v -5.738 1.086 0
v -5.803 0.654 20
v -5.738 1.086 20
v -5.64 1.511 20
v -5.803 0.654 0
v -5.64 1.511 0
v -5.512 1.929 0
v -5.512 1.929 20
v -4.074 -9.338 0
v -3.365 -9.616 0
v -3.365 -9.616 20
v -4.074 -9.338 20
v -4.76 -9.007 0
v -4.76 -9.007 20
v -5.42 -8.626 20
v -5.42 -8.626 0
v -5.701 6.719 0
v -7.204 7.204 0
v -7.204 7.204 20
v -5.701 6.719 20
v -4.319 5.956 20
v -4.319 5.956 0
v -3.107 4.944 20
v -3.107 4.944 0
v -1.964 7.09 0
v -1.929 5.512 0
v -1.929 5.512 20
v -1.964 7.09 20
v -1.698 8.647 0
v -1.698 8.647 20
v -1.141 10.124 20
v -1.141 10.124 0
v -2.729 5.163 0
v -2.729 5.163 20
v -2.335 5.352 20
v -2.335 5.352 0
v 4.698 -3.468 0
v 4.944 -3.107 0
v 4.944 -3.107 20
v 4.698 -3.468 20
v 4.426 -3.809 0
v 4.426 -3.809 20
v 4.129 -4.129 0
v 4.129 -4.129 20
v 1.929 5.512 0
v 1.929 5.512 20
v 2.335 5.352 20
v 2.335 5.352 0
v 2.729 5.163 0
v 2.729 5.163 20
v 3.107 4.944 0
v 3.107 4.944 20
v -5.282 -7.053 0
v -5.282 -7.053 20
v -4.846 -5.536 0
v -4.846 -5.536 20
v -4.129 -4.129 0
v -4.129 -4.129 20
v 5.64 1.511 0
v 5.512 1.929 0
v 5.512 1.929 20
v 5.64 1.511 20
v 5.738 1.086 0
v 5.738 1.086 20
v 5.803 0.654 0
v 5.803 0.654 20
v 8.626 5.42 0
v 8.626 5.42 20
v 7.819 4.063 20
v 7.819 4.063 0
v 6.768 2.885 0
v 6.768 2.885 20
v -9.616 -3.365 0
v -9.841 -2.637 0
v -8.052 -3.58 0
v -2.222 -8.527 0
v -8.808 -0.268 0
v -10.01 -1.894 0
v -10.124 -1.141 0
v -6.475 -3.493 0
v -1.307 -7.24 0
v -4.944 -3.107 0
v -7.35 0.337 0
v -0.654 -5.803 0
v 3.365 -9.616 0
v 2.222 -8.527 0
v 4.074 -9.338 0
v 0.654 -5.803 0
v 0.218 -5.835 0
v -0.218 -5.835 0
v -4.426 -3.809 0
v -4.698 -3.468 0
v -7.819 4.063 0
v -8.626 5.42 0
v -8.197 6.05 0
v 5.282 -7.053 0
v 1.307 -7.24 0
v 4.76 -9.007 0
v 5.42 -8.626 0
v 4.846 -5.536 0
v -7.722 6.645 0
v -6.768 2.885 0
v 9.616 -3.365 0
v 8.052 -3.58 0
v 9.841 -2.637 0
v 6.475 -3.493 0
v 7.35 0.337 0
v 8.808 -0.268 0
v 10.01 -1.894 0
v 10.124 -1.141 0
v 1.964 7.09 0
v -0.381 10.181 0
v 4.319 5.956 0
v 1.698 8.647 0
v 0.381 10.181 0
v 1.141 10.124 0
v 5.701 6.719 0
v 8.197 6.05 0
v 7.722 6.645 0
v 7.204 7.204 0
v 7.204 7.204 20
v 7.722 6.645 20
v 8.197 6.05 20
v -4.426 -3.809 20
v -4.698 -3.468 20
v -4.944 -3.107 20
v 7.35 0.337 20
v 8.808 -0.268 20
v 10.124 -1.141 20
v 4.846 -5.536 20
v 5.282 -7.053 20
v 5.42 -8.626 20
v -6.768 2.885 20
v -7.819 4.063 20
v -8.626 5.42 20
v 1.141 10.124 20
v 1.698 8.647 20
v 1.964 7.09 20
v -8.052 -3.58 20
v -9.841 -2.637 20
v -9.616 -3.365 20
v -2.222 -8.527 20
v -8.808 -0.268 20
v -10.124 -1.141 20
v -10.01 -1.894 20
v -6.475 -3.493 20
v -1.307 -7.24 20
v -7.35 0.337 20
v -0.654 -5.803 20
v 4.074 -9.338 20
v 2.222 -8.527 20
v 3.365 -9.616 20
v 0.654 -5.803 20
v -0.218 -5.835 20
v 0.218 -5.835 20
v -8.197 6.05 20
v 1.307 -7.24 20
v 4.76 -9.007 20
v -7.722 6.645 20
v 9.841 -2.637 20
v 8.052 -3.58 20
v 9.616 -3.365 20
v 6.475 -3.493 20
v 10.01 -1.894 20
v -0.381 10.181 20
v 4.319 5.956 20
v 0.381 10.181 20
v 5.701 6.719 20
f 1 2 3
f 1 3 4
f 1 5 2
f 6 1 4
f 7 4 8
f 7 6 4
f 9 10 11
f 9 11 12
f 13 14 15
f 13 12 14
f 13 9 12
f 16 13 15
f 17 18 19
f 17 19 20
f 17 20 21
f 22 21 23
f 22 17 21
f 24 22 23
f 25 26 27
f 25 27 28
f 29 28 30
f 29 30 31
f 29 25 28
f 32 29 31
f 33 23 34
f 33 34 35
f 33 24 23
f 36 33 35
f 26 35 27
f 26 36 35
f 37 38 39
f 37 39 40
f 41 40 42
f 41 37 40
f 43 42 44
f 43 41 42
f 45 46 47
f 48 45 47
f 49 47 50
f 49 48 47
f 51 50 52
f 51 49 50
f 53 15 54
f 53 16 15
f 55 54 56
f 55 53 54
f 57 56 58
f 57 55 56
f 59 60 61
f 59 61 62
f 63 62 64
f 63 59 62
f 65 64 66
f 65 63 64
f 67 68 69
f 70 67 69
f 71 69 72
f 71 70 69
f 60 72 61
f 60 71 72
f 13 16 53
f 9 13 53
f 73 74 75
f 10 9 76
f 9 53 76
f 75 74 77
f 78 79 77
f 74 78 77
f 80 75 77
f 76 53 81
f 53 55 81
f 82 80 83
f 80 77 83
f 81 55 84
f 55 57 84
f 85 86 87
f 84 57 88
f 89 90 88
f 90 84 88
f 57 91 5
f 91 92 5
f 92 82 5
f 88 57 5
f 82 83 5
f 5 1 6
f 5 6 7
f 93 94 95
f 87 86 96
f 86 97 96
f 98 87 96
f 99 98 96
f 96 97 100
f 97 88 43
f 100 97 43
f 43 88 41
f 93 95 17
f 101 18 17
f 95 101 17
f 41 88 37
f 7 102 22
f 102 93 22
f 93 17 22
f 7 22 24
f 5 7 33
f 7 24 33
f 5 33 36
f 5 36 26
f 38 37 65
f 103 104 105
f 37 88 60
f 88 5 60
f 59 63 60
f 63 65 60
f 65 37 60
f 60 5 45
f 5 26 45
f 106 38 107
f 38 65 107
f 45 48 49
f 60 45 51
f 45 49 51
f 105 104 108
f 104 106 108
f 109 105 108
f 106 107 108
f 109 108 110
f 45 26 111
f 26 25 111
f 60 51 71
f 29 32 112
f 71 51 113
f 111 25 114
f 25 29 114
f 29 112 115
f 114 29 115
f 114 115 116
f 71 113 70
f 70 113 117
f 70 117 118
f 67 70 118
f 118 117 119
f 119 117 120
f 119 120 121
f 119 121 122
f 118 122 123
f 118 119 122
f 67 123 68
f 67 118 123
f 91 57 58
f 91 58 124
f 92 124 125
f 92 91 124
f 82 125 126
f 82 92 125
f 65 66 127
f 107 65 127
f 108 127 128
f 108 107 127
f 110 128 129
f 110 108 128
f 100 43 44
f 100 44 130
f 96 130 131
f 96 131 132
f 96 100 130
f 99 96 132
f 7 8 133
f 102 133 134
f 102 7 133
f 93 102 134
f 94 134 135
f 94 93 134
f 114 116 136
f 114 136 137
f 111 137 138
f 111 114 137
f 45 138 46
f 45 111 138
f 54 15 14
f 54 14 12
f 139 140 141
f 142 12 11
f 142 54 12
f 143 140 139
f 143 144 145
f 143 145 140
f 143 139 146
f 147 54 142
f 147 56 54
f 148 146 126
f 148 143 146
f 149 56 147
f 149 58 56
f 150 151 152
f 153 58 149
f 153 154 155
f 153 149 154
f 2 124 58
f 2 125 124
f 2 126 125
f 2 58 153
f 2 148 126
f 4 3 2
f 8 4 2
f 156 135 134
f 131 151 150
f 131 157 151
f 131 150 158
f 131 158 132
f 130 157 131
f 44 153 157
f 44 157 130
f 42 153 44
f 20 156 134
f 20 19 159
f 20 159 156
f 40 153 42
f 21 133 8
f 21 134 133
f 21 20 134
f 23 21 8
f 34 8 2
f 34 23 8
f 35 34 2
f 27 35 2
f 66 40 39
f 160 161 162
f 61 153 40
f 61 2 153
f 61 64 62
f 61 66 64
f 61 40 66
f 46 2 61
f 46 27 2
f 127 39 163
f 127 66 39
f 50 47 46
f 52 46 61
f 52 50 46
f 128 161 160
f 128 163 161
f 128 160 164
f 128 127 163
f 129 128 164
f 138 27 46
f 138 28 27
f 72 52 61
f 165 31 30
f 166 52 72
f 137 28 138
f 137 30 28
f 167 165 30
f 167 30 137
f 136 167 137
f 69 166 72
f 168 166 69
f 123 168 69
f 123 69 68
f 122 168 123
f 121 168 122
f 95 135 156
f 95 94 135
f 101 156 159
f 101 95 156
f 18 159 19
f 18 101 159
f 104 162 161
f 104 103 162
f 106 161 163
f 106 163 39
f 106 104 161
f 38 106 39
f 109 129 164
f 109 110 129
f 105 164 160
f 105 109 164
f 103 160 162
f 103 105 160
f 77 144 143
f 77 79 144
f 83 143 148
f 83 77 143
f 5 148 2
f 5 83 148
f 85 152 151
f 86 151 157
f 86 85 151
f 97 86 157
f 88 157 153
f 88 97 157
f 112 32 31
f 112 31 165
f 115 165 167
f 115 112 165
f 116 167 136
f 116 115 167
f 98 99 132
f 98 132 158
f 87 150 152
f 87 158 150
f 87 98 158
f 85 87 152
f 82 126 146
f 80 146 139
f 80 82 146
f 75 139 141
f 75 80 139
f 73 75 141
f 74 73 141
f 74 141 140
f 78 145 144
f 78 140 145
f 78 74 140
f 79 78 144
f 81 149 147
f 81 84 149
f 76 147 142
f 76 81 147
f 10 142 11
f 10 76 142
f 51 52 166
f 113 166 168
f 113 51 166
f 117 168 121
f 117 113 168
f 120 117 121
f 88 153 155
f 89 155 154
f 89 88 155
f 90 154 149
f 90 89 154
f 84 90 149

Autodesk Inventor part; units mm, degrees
sketch "Sketch1" plane through (0, 0, 0) normal (0, 0, 1) x (1, 0, 0)
  circle A0 centre (0, 0) radius 10.1879
  dimension "d0" = 20.3758
extrude "Extrusion1" add sketch "Sketch1" along normal blind 20
ref_plane "Work Plane2" through (0, 0, 10) normal (0, 0, 1) x (1, 0, 0)
sketch "Sketch2" plane through (0, 0, 0) normal (0, 0, -1) x (-1, 0, 0)
  circle A0 centre (0, 0) radius 10.1879 projected
  circle A1 centre (0, 0) radius 7.147
  dimension "d3" = 14.2941
surface extrude "Pitch Diameter" sketch "Sketch2" against normal through all shown no curves A1
ref_plane "Work Plane8" through (0, 0, 0) normal (0.9009689, 0.4338837, 0) x (0, 0, 1)
ref_plane "Work Plane9" through (0, 0, 0) normal (1, 0, 0) x (0, 1, 0)
spur gear teeth "Spur Gear" teeth 7 pitch diameter 14 tip diameter 20.3758 root diameter 11.6787 face width 20 start plane through (0, 0, 0) normal (0, 0, -1) x (-1, 0, 0)
equation "\"d0\" = da_da"
equation "\"d1\" = da_b"
equation "\"d3\" = da_dw"
equation "\"d16\" = da_aw"
equation "\"d43\" = da_aw"
equation "\"d46\" = da_aw"
equation "\"da_da\" = 20.375829"
equation "\"da_b\" = 20"
equation "\"da_dw\" = 14.294055"
equation "\"da_aw\" = 35.735137"
properties part number "Spur Gear1" material "Steel"
